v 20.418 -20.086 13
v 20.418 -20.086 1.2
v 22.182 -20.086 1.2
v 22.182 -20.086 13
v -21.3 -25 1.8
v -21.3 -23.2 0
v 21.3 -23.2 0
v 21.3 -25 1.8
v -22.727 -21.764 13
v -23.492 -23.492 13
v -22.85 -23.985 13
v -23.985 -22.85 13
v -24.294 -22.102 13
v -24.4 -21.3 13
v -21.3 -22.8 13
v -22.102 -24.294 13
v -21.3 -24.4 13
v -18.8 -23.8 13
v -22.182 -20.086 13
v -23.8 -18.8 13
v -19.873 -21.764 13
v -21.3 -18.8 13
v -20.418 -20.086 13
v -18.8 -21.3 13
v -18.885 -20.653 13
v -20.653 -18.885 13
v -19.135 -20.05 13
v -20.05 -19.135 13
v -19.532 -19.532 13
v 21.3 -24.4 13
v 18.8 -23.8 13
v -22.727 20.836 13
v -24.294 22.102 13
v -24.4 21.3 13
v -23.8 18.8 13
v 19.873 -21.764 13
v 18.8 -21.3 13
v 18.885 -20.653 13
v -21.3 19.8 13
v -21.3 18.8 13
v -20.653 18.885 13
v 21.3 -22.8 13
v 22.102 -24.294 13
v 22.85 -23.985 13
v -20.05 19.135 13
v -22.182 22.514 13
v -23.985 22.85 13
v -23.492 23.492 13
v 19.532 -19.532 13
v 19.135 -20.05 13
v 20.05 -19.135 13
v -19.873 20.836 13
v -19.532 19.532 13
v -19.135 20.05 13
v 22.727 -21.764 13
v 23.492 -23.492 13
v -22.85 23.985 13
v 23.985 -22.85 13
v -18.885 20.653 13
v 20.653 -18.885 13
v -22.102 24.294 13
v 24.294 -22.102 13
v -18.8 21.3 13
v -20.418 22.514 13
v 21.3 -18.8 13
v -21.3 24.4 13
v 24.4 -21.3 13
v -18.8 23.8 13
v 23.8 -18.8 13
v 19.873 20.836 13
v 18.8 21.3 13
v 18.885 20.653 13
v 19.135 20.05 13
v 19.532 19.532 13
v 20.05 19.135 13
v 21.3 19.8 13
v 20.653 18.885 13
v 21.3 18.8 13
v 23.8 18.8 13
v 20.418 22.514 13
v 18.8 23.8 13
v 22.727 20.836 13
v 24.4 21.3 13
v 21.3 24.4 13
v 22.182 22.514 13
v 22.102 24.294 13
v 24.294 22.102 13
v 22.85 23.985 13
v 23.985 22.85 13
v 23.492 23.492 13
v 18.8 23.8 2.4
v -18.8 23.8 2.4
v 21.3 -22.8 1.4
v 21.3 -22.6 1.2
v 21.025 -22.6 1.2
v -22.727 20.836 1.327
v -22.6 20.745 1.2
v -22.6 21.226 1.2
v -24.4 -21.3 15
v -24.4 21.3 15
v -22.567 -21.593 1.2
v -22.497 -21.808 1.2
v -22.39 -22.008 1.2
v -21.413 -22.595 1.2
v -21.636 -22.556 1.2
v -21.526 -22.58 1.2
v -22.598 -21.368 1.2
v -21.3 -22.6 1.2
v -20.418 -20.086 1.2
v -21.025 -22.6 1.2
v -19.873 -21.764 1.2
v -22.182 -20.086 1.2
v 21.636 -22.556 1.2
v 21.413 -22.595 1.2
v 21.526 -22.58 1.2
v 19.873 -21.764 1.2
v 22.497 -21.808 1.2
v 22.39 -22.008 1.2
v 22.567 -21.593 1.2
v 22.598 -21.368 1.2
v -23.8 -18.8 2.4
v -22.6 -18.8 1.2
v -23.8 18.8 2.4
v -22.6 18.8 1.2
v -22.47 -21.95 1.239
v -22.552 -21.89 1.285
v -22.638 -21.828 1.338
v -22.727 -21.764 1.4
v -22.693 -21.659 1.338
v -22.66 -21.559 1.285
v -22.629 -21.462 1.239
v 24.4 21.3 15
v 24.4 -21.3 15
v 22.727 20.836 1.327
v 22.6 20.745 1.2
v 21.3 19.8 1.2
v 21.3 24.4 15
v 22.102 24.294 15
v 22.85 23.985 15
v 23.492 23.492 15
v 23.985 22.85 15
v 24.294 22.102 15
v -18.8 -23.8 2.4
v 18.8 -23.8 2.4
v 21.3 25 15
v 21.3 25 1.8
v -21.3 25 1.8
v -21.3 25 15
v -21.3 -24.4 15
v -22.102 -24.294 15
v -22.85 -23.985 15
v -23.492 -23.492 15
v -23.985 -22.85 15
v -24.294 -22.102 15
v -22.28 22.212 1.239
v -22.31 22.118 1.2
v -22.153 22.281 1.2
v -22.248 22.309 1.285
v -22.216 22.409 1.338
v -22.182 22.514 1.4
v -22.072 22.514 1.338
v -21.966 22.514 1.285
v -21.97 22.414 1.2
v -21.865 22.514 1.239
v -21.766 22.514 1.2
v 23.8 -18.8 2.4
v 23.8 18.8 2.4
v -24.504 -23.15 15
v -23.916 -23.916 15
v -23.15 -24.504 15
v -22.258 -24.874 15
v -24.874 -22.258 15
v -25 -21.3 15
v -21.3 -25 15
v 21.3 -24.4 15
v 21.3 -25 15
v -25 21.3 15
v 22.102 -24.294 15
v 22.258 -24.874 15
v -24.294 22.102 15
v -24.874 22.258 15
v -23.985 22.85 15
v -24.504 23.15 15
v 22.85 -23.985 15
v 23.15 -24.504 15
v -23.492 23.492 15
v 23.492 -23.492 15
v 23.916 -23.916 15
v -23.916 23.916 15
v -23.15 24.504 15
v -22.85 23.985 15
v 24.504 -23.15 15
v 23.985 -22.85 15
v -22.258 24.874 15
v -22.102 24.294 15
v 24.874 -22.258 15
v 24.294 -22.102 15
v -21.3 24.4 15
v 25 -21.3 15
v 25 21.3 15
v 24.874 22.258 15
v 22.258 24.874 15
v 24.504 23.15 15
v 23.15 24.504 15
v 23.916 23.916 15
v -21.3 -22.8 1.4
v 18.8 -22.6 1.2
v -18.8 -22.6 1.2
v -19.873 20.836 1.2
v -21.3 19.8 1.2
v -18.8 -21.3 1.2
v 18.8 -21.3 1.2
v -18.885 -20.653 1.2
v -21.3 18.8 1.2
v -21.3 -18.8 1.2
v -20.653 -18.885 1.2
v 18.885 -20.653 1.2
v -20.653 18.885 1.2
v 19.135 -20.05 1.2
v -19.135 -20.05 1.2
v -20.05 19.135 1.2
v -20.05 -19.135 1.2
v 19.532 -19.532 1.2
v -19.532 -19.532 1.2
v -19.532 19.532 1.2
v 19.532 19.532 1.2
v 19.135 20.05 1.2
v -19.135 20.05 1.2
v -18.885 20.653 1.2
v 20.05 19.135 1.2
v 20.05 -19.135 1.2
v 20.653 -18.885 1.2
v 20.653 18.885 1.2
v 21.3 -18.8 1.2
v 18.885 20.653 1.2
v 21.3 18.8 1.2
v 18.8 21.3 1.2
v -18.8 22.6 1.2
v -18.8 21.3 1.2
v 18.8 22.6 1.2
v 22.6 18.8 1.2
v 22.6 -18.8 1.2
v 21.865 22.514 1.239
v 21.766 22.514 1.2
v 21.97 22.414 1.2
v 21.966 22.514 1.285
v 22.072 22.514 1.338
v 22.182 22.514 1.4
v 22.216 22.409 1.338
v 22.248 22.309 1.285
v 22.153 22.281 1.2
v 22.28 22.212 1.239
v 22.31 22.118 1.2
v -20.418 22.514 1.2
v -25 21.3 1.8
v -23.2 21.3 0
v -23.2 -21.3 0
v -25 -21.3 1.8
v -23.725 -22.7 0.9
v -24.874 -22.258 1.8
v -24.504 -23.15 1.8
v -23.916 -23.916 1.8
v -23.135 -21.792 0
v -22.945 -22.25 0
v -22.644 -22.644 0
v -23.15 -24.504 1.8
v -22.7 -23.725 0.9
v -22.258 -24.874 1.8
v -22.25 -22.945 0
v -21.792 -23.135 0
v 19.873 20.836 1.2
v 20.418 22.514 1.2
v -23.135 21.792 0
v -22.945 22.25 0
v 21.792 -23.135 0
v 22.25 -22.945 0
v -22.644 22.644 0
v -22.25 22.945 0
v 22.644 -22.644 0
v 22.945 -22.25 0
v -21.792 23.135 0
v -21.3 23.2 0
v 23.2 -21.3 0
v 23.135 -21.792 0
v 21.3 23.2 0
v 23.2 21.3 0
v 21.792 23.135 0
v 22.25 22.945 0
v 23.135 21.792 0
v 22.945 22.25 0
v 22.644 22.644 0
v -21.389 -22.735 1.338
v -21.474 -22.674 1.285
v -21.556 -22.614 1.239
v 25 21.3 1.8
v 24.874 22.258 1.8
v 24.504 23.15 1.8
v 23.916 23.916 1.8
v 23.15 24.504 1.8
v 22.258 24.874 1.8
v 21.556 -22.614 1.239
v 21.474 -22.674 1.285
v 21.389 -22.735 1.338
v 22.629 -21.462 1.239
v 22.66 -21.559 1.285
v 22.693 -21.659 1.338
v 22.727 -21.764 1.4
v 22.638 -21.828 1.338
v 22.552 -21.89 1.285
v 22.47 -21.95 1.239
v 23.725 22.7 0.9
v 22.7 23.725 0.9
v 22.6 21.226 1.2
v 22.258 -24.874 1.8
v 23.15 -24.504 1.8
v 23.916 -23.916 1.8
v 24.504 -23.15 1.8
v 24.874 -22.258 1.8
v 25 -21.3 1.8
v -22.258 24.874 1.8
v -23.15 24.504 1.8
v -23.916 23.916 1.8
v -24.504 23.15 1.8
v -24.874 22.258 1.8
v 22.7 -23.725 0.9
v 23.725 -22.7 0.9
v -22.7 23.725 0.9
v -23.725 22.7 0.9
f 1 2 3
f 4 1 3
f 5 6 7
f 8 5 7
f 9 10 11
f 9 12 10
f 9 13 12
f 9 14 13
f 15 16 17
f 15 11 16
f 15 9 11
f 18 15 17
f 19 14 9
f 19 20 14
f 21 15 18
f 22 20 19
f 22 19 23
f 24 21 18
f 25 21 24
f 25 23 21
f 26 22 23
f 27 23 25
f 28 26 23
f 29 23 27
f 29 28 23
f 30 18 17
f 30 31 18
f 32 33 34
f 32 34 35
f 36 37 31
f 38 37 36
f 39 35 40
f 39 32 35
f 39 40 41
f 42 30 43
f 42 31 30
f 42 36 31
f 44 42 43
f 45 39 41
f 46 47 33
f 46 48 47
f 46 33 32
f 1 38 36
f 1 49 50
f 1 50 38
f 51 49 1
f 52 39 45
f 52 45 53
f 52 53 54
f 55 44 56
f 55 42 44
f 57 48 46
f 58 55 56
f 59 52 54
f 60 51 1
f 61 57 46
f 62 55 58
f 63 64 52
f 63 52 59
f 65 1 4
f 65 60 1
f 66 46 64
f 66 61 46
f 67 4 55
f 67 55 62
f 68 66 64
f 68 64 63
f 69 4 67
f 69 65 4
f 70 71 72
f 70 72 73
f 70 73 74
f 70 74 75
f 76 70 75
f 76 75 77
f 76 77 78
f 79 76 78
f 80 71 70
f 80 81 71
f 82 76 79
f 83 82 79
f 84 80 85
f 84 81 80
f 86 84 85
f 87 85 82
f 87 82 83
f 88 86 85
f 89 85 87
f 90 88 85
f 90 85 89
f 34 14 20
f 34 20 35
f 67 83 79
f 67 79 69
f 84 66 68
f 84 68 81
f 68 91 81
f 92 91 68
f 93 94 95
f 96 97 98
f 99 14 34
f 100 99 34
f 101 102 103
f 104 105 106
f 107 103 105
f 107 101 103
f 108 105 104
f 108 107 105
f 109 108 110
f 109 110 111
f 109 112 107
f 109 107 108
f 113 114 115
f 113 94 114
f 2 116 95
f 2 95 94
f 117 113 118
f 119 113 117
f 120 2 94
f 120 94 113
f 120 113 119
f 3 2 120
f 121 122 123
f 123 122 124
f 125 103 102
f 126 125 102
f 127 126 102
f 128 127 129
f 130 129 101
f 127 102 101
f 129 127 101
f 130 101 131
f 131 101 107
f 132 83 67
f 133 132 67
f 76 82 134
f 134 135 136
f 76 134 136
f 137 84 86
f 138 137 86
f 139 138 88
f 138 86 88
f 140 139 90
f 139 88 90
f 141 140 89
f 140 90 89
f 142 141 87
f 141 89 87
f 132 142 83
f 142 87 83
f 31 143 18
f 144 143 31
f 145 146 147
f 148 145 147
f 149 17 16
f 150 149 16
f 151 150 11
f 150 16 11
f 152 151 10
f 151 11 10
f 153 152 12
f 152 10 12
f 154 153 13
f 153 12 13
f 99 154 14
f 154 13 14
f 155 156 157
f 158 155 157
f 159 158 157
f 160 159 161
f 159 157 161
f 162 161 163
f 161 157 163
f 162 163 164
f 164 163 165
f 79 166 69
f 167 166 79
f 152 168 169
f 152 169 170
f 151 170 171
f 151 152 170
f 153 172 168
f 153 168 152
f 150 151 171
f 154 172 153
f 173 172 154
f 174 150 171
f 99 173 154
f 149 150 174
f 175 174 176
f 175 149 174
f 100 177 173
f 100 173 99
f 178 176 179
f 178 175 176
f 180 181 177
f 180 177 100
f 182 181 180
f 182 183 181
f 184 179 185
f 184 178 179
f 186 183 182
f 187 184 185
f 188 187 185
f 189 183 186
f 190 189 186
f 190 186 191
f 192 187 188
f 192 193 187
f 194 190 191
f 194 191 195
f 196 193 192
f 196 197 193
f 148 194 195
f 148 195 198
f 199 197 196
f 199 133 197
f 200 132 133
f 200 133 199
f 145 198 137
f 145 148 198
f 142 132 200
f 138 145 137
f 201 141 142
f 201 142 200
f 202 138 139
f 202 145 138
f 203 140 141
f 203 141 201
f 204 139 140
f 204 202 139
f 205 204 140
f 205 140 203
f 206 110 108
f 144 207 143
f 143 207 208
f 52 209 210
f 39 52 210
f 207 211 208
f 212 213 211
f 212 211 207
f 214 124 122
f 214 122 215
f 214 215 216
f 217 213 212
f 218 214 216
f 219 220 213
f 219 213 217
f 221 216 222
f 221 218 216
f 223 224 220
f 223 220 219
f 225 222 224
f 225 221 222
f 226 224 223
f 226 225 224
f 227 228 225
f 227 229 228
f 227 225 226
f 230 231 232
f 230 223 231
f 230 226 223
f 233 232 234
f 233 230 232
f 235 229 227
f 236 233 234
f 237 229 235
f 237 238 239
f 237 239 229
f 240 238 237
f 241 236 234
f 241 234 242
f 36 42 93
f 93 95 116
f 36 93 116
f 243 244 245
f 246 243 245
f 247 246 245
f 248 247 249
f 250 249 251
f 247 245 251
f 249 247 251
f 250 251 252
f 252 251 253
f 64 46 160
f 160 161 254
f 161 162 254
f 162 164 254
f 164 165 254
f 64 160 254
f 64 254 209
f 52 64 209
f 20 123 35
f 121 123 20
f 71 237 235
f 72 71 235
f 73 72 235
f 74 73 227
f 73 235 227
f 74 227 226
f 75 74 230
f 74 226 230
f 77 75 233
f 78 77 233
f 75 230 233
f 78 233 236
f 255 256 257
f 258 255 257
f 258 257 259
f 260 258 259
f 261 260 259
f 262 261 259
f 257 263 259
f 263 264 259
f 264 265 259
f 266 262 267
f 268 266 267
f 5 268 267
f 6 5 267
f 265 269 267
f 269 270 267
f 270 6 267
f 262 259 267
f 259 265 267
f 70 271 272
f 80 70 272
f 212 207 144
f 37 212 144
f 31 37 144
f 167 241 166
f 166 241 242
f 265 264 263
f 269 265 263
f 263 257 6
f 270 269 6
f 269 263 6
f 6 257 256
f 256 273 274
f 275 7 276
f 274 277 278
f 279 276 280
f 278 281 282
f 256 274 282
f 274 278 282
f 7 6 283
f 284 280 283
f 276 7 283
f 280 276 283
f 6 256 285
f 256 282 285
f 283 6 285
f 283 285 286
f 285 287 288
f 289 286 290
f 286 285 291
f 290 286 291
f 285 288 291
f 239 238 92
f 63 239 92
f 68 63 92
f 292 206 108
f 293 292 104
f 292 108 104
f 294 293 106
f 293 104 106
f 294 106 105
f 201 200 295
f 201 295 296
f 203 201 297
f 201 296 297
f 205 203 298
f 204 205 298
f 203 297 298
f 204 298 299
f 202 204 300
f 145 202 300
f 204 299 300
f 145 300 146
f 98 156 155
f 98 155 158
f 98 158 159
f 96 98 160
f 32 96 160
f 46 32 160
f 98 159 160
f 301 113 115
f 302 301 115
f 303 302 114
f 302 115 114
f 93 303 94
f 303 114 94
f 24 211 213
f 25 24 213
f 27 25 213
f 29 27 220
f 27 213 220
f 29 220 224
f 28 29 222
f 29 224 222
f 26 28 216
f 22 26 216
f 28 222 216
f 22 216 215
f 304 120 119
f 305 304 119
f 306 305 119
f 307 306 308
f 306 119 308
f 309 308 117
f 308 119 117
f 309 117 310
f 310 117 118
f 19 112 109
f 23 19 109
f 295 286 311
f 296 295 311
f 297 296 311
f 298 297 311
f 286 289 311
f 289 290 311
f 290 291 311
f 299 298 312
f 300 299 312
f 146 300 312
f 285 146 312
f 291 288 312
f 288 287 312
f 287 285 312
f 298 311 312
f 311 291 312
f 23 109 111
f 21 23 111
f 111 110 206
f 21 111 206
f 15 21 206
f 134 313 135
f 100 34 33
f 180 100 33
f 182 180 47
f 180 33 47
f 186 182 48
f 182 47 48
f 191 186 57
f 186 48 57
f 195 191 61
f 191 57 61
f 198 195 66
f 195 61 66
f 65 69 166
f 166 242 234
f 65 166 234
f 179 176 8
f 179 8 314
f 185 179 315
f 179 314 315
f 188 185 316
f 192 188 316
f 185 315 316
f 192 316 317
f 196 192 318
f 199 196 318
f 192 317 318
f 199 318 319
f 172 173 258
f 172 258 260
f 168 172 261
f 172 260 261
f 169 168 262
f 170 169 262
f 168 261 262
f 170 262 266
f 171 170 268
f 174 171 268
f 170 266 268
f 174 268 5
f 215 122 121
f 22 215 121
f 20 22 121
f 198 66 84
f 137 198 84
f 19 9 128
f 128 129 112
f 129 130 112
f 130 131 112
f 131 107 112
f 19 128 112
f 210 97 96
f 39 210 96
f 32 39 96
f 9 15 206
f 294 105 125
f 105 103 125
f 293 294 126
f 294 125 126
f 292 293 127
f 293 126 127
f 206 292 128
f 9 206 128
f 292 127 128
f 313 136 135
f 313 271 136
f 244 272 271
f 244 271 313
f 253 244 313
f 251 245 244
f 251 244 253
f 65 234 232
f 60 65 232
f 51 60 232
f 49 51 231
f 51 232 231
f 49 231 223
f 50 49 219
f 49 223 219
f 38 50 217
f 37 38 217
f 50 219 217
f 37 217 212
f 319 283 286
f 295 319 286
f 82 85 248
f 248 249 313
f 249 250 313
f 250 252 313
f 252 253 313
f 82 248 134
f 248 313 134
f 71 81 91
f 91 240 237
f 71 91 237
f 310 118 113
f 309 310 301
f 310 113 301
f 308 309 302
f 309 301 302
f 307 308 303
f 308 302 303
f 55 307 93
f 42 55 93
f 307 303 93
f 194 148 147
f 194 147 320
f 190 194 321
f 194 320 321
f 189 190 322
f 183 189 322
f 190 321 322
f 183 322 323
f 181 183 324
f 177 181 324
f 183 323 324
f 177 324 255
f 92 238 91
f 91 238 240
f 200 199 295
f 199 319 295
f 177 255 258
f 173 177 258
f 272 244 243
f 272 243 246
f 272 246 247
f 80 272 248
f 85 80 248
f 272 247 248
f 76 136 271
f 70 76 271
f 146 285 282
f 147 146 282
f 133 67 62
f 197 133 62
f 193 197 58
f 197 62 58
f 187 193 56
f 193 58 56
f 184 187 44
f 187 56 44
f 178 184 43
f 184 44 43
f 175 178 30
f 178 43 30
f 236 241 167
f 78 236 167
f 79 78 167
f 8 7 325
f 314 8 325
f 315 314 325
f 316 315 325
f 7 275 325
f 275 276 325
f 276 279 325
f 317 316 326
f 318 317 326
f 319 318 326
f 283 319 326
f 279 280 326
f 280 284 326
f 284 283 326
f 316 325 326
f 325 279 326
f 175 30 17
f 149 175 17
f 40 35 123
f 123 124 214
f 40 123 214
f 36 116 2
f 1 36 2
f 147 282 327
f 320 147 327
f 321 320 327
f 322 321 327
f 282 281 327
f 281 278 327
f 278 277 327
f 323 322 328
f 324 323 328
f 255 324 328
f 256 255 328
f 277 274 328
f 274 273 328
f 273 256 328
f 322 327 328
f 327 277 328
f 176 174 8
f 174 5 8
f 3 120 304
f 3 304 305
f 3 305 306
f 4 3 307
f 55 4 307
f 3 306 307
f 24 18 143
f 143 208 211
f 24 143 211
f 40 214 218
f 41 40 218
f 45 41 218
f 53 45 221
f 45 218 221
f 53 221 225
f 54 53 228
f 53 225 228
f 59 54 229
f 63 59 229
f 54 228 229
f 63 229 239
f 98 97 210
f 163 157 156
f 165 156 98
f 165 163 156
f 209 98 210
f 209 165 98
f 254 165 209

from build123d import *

# Parameters (mm, degrees)
F3_DEPTH  = 13
F4_T      = -1.2
F6_SIZE   = 1.8
F7_SIZE   = 1.2
F8_DEPTH  = 11.8
F10_DEPTH = 2


# Not quite as in the source:
# - a feature names something its author has since deleted; it is built from what else it names


with BuildPart() as f3:
    # F2 (on Top) → F3 (new body)
    with BuildSketch(Plane.XY):
        with BuildLine():
            ThreePointArc((-25, -21.3), (-23.9162950904, -23.9162950904), (-21.3, -25))
            Line((-21.3, -25), (21.3, -25))
            ThreePointArc((21.3, -25), (23.9162950904, -23.9162950904), (25, -21.3))
            Line((25, -21.3), (25, 21.3))
            ThreePointArc((25, 21.3), (23.9162950904, 23.9162950904), (21.3, 25))
            Line((21.3, 25), (-21.3, 25))
            ThreePointArc((-21.3, 25), (-23.9162950904, 23.9162950904), (-25, 21.3))
            Line((-25, 21.3), (-25, -21.3))
        make_face()
    extrude(amount=F3_DEPTH)

    # F4
    f4_openings = [f3.faces().sort_by_distance(p)[0] for p in [
        (0, 0, 13),
    ]]
    offset(amount=F4_T, openings=f4_openings)

    # F6
    f6_edges = [f3.edges().sort_by_distance(p)[0] for p in [
        (-23.916295, -23.916295, 0),
        (0, -25, 0),
        (23.916295, -23.916295, 0),
        (25, 0, 0),
        (23.916295, 23.916295, 0),
        (0, 25, 0),
        (-23.916295, 23.916295, 0),
        (-25, 0, 0),
    ]]
    chamfer(f6_edges, length=F6_SIZE)

    # F7
    f7_edges = [f3.edges().sort_by_distance(p)[0] for p in [
        (-23.067767, -23.067767, 1.2),
        (0, -23.8, 1.2),
        (23.067767, -23.067767, 1.2),
        (23.8, 0, 1.2),
        (23.067767, 23.067767, 1.2),
        (0, 23.8, 1.2),
        (-23.067767, 23.067767, 1.2),
        (-23.8, 0, 1.2),
    ]]
    chamfer(f7_edges, length=F7_SIZE)

    # F5 (on face) → F8 (join, through all)
    with BuildSketch(Plane.XY.offset(1.2)):
        with BuildLine():
            Line((-23.8, 18.8), (-21.3, 18.8))
            ThreePointArc((-21.3, 18.8), (-19.532233047, 19.532233047), (-18.8, 21.3))
            Line((-18.8, 21.3), (-18.8, 23.8))
            Line((-18.8, 23.8), (-21.3, 23.8))
            ThreePointArc((-21.3, 23.8), (-23.067766953, 23.067766953), (-23.8, 21.3))
            Line((-23.8, 21.3), (-23.8, 18.8))
        make_face()
        Polygon((-19.8734152256, 20.8364745084), (-21.3, 19.8), (-22.7265847744, 20.8364745084), (-22.1816778784, 22.5135254916), (-20.4183221216, 22.5135254916), align=None, mode=Mode.SUBTRACT)
        with BuildLine():
            Line((-21.3, -18.8), (-23.8, -18.8))
            Line((-23.8, -18.8), (-23.8, -21.3))
            ThreePointArc((-23.8, -21.3), (-23.067766953, -23.067766953), (-21.3, -23.8))
            Line((-21.3, -23.8), (-18.8, -23.8))
            Line((-18.8, -23.8), (-18.8, -21.3))
            ThreePointArc((-18.8, -21.3), (-19.532233047, -19.532233047), (-21.3, -18.8))
        make_face()
        Polygon((-22.7265847744, -21.7635254916), (-22.1816778784, -20.0864745084), (-20.4183221216, -20.0864745084), (-19.8734152256, -21.7635254916), (-21.3, -22.8), align=None, mode=Mode.SUBTRACT)
        with BuildLine():
            Line((21.3, 23.8), (18.8, 23.8))
            Line((18.8, 23.8), (18.8, 21.3))
            ThreePointArc((18.8, 21.3), (19.532233047, 19.532233047), (21.3, 18.8))
            Line((21.3, 18.8), (23.8, 18.8))
            Line((23.8, 18.8), (23.8, 21.3))
            ThreePointArc((23.8, 21.3), (23.067766953, 23.067766953), (21.3, 23.8))
        make_face()
        Polygon((19.8734152256, 20.8364745084), (20.4183221216, 22.5135254916), (22.1816778784, 22.5135254916), (22.7265847744, 20.8364745084), (21.3, 19.8), align=None, mode=Mode.SUBTRACT)
        with BuildLine():
            Line((18.8, -21.3), (18.8, -23.8))
            Line((18.8, -23.8), (21.3, -23.8))
            ThreePointArc((21.3, -23.8), (23.067766953, -23.067766953), (23.8, -21.3))
            Line((23.8, -21.3), (23.8, -18.8))
            Line((23.8, -18.8), (21.3, -18.8))
            ThreePointArc((21.3, -18.8), (19.532233047, -19.532233047), (18.8, -21.3))
        make_face()
        Polygon((19.8734152256, -21.7635254916), (20.4183221216, -20.0864745084), (22.1816778784, -20.0864745084), (22.7265847744, -21.7635254916), (21.3, -22.8), align=None, mode=Mode.SUBTRACT)
    extrude(amount=F8_DEPTH)

    # F9 (on face) → F10 (join)
    with BuildSketch(Plane.XY.offset(13)):
        with BuildLine():
            Line((-25, 21.3), (-25, -21.3))
            ThreePointArc((-25, -21.3), (-23.9162950904, -23.9162950904), (-21.3, -25))
            Line((-21.3, -25), (21.3, -25))
            ThreePointArc((21.3, -25), (23.9162950904, -23.9162950904), (25, -21.3))
            Line((25, -21.3), (25, 21.3))
            ThreePointArc((25, 21.3), (23.9162950904, 23.9162950904), (21.3, 25))
            Line((21.3, 25), (-21.3, 25))
            ThreePointArc((-21.3, 25), (-23.9162950904, 23.9162950904), (-25, 21.3))
        make_face()
        with BuildLine():
            ThreePointArc((-24.4, 21.3), (-23.4920310217, 23.4920310217), (-21.3, 24.4))
            Line((-21.3, 24.4), (21.3, 24.4))
            ThreePointArc((21.3, 24.4), (23.4920310217, 23.4920310217), (24.4, 21.3))
            Line((24.4, 21.3), (24.4, -21.3))
            ThreePointArc((24.4, -21.3), (23.4920310217, -23.4920310217), (21.3, -24.4))
            Line((21.3, -24.4), (-21.3, -24.4))
            ThreePointArc((-21.3, -24.4), (-23.4920310217, -23.4920310217), (-24.4, -21.3))
            Line((-24.4, -21.3), (-24.4, 21.3))
        make_face(mode=Mode.SUBTRACT)
    extrude(amount=F10_DEPTH)


solid = f3.part
